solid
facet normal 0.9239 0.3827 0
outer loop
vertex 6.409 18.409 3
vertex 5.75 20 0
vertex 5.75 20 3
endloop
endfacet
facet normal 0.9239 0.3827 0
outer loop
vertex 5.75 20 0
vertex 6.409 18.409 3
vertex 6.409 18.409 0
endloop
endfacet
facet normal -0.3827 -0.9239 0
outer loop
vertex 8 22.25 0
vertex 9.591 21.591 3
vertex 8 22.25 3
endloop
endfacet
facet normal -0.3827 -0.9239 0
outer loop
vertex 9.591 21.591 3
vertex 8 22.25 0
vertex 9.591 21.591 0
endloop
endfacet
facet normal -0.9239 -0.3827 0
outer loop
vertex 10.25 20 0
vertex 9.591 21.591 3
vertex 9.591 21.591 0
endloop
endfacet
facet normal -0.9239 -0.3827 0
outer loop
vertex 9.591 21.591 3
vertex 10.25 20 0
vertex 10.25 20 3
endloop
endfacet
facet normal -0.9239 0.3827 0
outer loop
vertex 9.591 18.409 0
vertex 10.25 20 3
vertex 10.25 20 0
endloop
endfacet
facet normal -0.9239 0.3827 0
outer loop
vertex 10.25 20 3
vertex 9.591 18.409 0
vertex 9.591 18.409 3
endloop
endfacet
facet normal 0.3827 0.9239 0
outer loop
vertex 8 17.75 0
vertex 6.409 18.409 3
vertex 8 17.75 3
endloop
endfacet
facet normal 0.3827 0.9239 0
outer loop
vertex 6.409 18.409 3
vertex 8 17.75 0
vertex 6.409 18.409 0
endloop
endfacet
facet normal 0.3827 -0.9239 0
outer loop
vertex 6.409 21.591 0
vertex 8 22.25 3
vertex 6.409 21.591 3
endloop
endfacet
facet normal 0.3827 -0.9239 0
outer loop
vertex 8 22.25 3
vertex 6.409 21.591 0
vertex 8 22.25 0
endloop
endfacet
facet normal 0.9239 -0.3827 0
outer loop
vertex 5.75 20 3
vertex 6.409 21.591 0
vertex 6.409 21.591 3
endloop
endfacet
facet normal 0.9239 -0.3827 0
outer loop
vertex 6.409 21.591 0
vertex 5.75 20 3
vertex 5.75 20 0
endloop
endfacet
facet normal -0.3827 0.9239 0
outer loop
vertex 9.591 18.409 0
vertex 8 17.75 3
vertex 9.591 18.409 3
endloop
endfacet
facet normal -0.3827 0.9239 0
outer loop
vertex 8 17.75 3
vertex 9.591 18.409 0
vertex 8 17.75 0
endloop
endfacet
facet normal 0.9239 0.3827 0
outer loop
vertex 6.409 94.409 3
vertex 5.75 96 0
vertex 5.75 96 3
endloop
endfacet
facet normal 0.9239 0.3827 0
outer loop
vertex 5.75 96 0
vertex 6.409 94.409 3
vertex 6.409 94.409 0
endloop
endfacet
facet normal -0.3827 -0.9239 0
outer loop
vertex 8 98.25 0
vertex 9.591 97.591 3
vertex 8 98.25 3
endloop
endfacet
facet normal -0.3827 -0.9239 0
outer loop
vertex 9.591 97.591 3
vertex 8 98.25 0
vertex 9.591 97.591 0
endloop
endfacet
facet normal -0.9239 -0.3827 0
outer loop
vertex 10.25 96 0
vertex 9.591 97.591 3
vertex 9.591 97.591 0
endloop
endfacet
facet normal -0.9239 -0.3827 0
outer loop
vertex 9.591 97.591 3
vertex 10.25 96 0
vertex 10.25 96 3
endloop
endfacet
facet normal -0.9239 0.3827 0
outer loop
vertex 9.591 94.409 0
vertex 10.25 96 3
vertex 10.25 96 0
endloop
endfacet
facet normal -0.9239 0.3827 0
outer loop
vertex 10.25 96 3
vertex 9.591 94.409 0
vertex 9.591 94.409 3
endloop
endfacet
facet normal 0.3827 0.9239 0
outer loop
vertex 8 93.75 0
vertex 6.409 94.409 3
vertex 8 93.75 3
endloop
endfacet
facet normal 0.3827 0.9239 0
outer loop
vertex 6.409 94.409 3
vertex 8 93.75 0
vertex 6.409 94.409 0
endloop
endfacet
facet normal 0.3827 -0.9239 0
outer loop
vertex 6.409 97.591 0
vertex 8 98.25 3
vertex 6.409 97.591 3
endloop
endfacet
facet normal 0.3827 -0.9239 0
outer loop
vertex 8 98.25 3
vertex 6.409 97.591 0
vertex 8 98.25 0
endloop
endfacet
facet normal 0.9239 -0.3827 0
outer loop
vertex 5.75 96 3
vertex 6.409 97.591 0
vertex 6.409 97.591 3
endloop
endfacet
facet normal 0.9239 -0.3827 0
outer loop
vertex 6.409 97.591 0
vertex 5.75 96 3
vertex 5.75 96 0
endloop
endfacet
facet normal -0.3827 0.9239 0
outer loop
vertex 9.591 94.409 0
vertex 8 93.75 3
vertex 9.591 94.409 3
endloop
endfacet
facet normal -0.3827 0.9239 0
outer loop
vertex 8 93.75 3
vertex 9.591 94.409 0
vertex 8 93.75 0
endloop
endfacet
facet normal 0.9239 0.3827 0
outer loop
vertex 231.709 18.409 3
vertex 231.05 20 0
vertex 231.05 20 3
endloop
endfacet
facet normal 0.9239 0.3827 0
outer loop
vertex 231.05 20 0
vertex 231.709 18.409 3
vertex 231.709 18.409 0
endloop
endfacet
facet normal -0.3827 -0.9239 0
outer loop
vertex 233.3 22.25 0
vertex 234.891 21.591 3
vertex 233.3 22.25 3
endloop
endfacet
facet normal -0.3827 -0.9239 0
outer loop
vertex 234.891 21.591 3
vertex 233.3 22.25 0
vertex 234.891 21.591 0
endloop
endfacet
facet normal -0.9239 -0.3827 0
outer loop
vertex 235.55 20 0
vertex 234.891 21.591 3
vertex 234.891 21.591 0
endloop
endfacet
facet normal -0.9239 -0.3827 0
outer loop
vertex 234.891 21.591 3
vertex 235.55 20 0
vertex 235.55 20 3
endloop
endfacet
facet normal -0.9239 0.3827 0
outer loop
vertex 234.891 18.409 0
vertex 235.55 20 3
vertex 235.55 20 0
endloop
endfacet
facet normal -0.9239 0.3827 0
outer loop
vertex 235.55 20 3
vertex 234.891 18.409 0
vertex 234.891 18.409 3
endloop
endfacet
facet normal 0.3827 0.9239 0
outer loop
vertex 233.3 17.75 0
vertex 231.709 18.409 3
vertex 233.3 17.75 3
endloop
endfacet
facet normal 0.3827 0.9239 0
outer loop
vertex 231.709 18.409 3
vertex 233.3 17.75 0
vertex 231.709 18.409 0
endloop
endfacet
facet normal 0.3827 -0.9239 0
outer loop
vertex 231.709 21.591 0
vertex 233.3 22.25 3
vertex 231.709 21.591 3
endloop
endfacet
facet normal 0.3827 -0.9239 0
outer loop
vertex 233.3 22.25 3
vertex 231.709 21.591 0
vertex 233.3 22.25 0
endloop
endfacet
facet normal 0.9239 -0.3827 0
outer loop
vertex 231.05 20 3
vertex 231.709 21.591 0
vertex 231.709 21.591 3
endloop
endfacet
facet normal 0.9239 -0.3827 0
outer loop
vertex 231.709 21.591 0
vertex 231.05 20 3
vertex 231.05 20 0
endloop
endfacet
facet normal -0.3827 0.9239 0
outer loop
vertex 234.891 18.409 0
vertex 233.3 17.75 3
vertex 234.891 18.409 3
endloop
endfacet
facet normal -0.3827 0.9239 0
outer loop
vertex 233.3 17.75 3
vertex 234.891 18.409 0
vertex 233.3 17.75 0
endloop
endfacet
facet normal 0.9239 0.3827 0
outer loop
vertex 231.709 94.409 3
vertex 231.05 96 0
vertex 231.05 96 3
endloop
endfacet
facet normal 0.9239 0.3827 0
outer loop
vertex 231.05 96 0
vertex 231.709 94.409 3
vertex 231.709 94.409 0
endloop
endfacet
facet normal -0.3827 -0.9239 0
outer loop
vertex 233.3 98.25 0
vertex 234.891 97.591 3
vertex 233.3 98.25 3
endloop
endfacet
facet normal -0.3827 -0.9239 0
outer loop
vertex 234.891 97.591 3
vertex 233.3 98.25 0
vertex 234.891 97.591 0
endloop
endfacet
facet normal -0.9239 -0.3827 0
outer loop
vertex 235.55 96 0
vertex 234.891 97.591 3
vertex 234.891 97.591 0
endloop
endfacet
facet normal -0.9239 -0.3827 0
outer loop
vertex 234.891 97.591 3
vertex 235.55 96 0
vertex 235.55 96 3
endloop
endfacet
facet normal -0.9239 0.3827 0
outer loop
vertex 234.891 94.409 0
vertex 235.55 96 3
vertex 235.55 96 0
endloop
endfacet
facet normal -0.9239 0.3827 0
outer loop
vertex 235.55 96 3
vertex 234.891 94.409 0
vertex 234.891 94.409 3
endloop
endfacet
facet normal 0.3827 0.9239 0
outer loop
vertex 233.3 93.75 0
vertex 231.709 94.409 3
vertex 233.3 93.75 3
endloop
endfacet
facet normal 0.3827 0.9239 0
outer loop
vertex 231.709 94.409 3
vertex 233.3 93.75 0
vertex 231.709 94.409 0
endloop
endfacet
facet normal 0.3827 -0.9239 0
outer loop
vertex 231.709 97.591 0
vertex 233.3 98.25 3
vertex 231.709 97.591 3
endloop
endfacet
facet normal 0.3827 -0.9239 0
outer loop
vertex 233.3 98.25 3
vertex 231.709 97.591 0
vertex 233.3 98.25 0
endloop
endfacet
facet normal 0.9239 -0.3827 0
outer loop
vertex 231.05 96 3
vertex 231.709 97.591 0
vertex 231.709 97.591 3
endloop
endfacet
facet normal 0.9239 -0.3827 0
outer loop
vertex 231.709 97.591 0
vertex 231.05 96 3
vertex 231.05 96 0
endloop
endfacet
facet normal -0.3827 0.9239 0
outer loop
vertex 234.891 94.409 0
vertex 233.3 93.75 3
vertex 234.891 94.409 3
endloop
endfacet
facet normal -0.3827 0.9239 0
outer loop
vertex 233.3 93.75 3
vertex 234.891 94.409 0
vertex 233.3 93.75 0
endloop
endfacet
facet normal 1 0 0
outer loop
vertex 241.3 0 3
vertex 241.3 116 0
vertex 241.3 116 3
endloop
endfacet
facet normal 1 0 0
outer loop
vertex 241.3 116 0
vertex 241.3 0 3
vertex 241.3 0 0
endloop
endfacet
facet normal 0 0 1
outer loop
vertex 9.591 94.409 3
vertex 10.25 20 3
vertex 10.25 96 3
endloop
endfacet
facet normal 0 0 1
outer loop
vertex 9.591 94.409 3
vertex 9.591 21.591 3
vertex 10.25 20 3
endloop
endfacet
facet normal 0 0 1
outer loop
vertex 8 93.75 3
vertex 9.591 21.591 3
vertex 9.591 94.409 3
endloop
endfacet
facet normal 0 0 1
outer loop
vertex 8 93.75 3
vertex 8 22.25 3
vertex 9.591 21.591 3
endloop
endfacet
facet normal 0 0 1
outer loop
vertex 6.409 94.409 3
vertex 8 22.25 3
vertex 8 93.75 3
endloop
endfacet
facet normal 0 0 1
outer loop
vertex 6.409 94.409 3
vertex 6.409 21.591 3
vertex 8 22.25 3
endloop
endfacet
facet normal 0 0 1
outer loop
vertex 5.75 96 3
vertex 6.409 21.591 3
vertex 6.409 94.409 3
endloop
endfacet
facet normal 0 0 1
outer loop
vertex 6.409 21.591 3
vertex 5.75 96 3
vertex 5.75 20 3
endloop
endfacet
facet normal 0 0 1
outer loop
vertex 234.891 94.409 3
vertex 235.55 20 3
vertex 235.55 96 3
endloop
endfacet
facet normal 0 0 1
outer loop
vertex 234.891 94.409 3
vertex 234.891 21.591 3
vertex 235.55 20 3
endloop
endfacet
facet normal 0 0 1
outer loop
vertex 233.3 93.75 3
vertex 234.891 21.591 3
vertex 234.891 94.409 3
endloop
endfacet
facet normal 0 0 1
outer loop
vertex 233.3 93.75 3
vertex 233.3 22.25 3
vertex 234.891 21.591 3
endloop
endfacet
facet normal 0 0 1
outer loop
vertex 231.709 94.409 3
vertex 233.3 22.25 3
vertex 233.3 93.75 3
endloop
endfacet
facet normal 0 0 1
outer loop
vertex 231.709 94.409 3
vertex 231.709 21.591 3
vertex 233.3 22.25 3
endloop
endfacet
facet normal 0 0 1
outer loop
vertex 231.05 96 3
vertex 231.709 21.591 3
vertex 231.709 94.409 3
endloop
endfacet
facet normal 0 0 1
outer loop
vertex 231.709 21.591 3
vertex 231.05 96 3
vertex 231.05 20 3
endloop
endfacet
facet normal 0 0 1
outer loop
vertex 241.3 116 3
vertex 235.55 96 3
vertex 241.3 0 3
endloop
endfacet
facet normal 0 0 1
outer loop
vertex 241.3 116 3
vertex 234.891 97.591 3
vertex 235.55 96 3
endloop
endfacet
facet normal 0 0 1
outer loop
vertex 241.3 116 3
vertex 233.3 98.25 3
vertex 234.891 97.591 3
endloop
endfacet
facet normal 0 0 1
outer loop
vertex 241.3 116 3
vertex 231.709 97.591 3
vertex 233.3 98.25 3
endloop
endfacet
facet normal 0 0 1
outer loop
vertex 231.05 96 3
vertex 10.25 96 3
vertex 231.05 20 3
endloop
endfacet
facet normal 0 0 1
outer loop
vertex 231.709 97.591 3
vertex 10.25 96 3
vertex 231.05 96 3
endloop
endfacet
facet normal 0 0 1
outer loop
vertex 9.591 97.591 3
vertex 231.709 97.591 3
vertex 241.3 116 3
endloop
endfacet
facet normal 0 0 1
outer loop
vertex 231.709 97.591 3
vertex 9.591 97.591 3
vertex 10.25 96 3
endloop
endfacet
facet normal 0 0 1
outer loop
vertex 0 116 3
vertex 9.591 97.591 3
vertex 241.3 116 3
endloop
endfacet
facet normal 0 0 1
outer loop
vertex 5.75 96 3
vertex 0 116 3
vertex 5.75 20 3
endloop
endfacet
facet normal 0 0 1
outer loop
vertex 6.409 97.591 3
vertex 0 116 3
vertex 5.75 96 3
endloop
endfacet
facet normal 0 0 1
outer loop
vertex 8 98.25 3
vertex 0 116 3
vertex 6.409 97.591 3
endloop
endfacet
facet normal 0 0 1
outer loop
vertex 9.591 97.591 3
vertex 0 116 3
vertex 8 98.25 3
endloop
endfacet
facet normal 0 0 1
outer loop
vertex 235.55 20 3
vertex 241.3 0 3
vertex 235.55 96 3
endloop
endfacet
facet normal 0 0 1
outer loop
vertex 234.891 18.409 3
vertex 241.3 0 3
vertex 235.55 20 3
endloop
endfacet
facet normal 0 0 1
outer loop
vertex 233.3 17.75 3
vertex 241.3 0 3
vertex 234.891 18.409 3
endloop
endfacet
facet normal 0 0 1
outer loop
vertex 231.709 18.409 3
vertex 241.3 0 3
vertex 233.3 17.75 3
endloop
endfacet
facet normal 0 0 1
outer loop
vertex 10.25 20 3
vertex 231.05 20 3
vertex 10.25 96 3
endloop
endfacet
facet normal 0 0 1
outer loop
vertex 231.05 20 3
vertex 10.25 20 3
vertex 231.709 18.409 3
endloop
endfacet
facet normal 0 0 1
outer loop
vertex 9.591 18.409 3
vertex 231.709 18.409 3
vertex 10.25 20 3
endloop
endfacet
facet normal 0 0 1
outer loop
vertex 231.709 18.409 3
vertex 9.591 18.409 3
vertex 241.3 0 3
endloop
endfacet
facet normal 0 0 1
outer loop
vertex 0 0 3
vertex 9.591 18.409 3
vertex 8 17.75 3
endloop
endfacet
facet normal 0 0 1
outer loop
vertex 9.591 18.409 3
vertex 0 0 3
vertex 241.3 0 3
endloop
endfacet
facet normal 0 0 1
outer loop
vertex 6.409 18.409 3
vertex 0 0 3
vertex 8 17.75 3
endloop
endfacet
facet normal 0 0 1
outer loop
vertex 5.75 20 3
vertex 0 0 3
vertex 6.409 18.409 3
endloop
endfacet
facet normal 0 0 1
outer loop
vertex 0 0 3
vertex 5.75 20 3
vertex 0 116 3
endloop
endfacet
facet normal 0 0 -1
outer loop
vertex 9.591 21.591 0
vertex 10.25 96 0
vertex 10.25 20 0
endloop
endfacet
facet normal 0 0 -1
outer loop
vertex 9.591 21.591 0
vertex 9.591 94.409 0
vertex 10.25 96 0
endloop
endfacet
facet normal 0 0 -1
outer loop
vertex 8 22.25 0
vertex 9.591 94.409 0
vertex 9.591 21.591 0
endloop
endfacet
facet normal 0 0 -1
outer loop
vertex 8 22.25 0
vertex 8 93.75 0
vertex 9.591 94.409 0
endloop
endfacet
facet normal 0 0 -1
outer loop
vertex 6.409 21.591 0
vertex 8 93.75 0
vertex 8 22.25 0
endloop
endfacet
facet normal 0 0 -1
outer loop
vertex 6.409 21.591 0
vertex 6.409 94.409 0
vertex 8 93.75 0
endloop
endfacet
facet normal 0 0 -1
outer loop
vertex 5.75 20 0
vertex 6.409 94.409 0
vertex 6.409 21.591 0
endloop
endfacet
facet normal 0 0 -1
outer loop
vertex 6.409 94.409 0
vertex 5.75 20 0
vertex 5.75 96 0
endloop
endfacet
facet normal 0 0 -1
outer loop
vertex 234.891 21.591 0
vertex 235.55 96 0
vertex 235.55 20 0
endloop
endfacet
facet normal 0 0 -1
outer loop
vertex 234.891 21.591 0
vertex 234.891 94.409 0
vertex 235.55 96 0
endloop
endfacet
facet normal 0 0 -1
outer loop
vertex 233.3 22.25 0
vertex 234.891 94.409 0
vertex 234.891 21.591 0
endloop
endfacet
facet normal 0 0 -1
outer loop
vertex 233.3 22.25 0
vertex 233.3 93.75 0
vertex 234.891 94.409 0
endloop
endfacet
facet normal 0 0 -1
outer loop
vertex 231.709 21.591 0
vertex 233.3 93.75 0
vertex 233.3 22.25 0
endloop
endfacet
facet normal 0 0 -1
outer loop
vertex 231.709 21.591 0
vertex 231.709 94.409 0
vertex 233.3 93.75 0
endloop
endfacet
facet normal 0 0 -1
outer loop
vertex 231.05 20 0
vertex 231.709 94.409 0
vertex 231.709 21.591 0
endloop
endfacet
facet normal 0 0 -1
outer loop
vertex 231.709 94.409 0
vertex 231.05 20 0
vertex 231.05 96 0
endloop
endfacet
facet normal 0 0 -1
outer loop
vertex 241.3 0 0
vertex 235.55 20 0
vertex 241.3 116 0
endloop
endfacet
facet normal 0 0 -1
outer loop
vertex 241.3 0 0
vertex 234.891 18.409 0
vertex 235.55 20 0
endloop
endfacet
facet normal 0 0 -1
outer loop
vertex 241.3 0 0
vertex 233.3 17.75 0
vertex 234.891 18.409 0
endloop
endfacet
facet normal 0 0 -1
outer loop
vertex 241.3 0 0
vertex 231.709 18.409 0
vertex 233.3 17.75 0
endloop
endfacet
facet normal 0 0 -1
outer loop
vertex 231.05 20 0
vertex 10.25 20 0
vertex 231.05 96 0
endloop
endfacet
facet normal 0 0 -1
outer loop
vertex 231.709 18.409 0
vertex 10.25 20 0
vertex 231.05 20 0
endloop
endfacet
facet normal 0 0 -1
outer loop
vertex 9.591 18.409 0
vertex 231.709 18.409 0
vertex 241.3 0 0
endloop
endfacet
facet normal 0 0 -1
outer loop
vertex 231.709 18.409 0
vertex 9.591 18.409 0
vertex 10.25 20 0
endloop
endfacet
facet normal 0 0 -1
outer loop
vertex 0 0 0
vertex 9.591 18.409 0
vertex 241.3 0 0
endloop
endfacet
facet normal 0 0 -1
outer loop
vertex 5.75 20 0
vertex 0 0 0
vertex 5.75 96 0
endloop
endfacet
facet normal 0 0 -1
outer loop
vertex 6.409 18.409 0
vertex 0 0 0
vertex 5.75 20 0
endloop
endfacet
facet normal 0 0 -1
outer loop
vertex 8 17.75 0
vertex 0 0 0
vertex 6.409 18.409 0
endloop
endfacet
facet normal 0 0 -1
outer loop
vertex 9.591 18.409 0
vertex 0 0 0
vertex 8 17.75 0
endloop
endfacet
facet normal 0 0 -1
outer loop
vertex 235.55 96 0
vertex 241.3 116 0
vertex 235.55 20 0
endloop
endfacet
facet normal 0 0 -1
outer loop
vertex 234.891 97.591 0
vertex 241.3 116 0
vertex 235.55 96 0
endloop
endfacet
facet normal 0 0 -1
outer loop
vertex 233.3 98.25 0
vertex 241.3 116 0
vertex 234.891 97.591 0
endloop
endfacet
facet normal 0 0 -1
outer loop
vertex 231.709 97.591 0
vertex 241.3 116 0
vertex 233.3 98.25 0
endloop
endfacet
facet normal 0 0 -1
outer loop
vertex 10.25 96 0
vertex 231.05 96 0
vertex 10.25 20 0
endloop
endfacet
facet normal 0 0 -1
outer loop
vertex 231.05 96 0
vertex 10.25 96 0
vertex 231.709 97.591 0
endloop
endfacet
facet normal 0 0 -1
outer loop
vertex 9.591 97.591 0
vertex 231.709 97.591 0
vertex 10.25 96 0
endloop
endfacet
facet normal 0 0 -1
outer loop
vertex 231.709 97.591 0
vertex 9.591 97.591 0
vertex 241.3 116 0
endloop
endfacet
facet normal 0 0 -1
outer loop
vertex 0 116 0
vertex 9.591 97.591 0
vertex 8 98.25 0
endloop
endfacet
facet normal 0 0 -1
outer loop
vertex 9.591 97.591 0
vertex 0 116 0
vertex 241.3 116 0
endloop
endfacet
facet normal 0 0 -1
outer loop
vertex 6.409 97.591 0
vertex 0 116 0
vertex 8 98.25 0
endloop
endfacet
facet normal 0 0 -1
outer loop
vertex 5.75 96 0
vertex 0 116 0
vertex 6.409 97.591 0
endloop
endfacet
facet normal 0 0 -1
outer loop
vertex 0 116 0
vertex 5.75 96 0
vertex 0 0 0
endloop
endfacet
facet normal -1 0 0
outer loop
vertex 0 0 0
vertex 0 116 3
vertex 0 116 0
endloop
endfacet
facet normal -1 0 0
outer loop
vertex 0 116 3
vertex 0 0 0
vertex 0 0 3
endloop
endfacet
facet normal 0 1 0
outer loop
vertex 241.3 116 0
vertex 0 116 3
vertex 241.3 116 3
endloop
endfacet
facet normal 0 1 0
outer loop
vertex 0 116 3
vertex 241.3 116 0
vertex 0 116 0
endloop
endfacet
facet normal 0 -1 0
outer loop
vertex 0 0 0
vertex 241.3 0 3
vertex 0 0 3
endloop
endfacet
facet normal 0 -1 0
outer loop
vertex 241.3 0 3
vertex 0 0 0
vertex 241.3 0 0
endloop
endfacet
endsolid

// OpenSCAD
// file: CircuitHolder.scad
//$fn=500;

$yOffset=77.5;
$xOffset=75.5;

function getCircuitHolderX() = $xOffset;
function getCircuitHolderY() = $yOffset;

module circuitHole()
{
	difference()
	{
		cylinder(d=8,h=10);
		circuitHoleCenter();
	}
}

module circuitHoleCenter()
{
	translate([0,0,-1]) cylinder(d=5.25,h=11);
}

module circuitHolder()
{
	circuitHole();
	translate([$xOffset,0,0]) circuitHole();
	translate([$xOffset,$yOffset,0]) circuitHole();
	translate([0,$yOffset,0]) circuitHole();
}

module circuitHolderHoles()
{
	circuitHoleCenter();
	translate([$xOffset,0,0]) circuitHoleCenter();
	translate([$xOffset,$yOffset,0]) circuitHoleCenter();
	translate([0,$yOffset,0]) circuitHoleCenter();
}

/*difference()
{
	cube([95,95,0.5]);
	translate([5,5,0]) circuitHolderHoles();
}*/
//translate([5,5,0]) circuitHolder();
// file: Piller.scad
use <Bottom.scad>;

function zOffset1() = getPillerThickness() * 1.5;
function zOffset2() = getPillerThickness() * 2;

module singlePiller()
{
	difference()
	{
		union()
		{
			translate([0,0,getWallHeight()/2]) cube([getPillerThickness(), getPillerThickness(), getWallHeight()], center=true);
		}

		cylinder(d=getHoleSize(),h=getWallHeight());
		translate([0,getPillerThickness()/2,zOffset1()]) rotate([90,0,0]) cylinder(d=getHoleSize(),h=getPillerThickness());
		translate([getPillerThickness()/2 * -1,0,zOffset2()]) rotate([0,90,0]) cylinder(d=getHoleSize(),h=getPillerThickness());
		translate([0,getPillerThickness()/2,getWallHeight() - zOffset1()]) rotate([90,0,0]) cylinder(d=getHoleSize(),h=getPillerThickness());
		translate([getPillerThickness()/2 * -1,0,getWallHeight() - zOffset2()]) rotate([0,90,0]) cylinder(d=getHoleSize(),h=getPillerThickness());
	}
}

module doublePiller()
{
	union()
	{
		singlePiller();
		translate([getPillerThickness(),0,0]) singlePiller();
	}
}

//doublePiller();
singlePiller();
// file: Bottom.scad
use <PowerHoles.scad>;
use <CircuitHolder.scad>;

$bottomX=241.3;
$bottomY=260.35;
$bottomZ=5;
$wallThickness=3;
$pillerThickness=10;
$connectorLength=20;
$connectorWidth=10;
$holeSize=3.9;
$throughHoleSize=4.5;
$wallHeight=116;


function getWallThickness() = $wallThickness;
function getHoleSize() = $holeSize;
function getWallHeight() = $wallHeight;
function getPillerThickness() = $pillerThickness;
function getBottomX() = $bottomX;
function getBottomY() = $bottomY;
function getBottomZ() = $bottomZ;
function getConnectorLength() = $connectorLength;
function getConnectorWidth() = $connectorWidth;
function getThroughHoleSize() = $throughHoleSize;

module boltHole()
{
	union()
	{
		cylinder(d=$throughHoleSize,h=20);
		translate([0,0,$pillerThickness]) cube([$pillerThickness,$pillerThickness,$pillerThickness], center=true);
	}
}

// Bottom cube
module bottomFront(bottomZ=$bottomZ)
{
	union()
	{
		difference()
		{
			cube([$bottomX,$bottomY/2,bottomZ]);
			translate([($pillerThickness/2)+$wallThickness,($pillerThickness/2)+$wallThickness,0]) boltHole();
			translate([($pillerThickness/2)+$wallThickness,($bottomY/2)-($pillerThickness/2),0]) boltHole();
			translate([$bottomX-(($pillerThickness/2)+$wallThickness),($pillerThickness/2)+$wallThickness,0]) boltHole();
			translate([$bottomX-($pillerThickness/2)-$wallThickness,($bottomY/2)-($pillerThickness/2),0]) boltHole();
			translate([($bottomX/2) + (getPowerHoleX()/2*-1),(($bottomY/2)*0.25)+20,0]) powerHoles();
		}
		translate([($bottomX*0.25)-($connectorWidth/2),($bottomY/2)-($connectorLength/2),0]) cube([$connectorWidth, $connectorLength,bottomZ]);
		translate([($bottomX*0.75)-($connectorWidth/2),($bottomY/2)-($connectorLength/2),0]) cube([$connectorWidth, $connectorLength,bottomZ]);
	}
}

module bottomBack(bottomZ=$bottomZ)
{
	union()
	{
		difference()
		{
			cube([$bottomX,$bottomY/2,bottomZ]);
			translate([($pillerThickness/2)+$wallThickness,($pillerThickness/2)+$wallThickness,0]) #boltHole();
			translate([($pillerThickness/2)+$wallThickness,($bottomY/2)-($pillerThickness/2),0]) #boltHole();
			translate([$bottomX-(($pillerThickness/2)+$wallThickness),($pillerThickness/2)+$wallThickness,0]) #boltHole();
			translate([$bottomX-($pillerThickness/2)-$wallThickness,($bottomY/2)-($pillerThickness/2),0]) #boltHole();
			translate([($bottomX*0.25)-($connectorWidth/2),($bottomY/2)-($connectorLength/2),0]) #cube([$connectorWidth, $connectorLength,bottomZ]);
			translate([($bottomX*0.75)-($connectorWidth/2),($bottomY/2)-($connectorLength/2),0]) #cube([$connectorWidth, $connectorLength,bottomZ]);
			translate([($bottomX*0.5) + (getCircuitHolderX()/2*-1),($bottomY*0.25) + (getCircuitHolderY()/2*-1),0]) #circuitHolderHoles();
		}
		translate([($bottomX*0.5) + (getCircuitHolderX()/2*-1),($bottomY*0.25) + (getCircuitHolderY()/2*-1),0]) #circuitHolder();
	}
}


bottomBack();
// file: PowerHoles.scad
$powerHoleX=151;
$powerHoleY=25;

module powerScrewHole()
{
	translate([0,0,-1]) cylinder(d=4.5,h=10);
}

function getPowerHoleX() = $powerHoleX;
function getPowerHoleY() = $powerHoleY;

module powerHoles()
{
	powerScrewHole();
	translate([0,$powerHoleY,0]) powerScrewHole();
	translate([$powerHoleX,0,0]) powerScrewHole();
	translate([$powerHoleX,$powerHoleY,0]) powerScrewHole();
}

powerHoles();
// main file
use <PowerHoles.scad>;
use <Bottom.scad>;
use <Piller.scad>;

module sideWall()
{
	difference()
	{
		union()
		{
			cube([getBottomX(),getWallHeight(),getWallThickness()]);
		}
		translate([getWallThickness()+(getPillerThickness()/2),zOffset2(),-1]) boltHole();
		translate([(getPillerThickness()/2)+getWallThickness(),getWallHeight()  - zOffset2(),-1]) boltHole();
		translate([getBottomX()-(getPillerThickness()/2)-getWallThickness(), zOffset2(),-1]) boltHole();
		translate([getBottomX()-(getPillerThickness()/2)-getWallThickness(),getWallHeight() - zOffset2(),-1]) boltHole();
	}
}

sideWall();
